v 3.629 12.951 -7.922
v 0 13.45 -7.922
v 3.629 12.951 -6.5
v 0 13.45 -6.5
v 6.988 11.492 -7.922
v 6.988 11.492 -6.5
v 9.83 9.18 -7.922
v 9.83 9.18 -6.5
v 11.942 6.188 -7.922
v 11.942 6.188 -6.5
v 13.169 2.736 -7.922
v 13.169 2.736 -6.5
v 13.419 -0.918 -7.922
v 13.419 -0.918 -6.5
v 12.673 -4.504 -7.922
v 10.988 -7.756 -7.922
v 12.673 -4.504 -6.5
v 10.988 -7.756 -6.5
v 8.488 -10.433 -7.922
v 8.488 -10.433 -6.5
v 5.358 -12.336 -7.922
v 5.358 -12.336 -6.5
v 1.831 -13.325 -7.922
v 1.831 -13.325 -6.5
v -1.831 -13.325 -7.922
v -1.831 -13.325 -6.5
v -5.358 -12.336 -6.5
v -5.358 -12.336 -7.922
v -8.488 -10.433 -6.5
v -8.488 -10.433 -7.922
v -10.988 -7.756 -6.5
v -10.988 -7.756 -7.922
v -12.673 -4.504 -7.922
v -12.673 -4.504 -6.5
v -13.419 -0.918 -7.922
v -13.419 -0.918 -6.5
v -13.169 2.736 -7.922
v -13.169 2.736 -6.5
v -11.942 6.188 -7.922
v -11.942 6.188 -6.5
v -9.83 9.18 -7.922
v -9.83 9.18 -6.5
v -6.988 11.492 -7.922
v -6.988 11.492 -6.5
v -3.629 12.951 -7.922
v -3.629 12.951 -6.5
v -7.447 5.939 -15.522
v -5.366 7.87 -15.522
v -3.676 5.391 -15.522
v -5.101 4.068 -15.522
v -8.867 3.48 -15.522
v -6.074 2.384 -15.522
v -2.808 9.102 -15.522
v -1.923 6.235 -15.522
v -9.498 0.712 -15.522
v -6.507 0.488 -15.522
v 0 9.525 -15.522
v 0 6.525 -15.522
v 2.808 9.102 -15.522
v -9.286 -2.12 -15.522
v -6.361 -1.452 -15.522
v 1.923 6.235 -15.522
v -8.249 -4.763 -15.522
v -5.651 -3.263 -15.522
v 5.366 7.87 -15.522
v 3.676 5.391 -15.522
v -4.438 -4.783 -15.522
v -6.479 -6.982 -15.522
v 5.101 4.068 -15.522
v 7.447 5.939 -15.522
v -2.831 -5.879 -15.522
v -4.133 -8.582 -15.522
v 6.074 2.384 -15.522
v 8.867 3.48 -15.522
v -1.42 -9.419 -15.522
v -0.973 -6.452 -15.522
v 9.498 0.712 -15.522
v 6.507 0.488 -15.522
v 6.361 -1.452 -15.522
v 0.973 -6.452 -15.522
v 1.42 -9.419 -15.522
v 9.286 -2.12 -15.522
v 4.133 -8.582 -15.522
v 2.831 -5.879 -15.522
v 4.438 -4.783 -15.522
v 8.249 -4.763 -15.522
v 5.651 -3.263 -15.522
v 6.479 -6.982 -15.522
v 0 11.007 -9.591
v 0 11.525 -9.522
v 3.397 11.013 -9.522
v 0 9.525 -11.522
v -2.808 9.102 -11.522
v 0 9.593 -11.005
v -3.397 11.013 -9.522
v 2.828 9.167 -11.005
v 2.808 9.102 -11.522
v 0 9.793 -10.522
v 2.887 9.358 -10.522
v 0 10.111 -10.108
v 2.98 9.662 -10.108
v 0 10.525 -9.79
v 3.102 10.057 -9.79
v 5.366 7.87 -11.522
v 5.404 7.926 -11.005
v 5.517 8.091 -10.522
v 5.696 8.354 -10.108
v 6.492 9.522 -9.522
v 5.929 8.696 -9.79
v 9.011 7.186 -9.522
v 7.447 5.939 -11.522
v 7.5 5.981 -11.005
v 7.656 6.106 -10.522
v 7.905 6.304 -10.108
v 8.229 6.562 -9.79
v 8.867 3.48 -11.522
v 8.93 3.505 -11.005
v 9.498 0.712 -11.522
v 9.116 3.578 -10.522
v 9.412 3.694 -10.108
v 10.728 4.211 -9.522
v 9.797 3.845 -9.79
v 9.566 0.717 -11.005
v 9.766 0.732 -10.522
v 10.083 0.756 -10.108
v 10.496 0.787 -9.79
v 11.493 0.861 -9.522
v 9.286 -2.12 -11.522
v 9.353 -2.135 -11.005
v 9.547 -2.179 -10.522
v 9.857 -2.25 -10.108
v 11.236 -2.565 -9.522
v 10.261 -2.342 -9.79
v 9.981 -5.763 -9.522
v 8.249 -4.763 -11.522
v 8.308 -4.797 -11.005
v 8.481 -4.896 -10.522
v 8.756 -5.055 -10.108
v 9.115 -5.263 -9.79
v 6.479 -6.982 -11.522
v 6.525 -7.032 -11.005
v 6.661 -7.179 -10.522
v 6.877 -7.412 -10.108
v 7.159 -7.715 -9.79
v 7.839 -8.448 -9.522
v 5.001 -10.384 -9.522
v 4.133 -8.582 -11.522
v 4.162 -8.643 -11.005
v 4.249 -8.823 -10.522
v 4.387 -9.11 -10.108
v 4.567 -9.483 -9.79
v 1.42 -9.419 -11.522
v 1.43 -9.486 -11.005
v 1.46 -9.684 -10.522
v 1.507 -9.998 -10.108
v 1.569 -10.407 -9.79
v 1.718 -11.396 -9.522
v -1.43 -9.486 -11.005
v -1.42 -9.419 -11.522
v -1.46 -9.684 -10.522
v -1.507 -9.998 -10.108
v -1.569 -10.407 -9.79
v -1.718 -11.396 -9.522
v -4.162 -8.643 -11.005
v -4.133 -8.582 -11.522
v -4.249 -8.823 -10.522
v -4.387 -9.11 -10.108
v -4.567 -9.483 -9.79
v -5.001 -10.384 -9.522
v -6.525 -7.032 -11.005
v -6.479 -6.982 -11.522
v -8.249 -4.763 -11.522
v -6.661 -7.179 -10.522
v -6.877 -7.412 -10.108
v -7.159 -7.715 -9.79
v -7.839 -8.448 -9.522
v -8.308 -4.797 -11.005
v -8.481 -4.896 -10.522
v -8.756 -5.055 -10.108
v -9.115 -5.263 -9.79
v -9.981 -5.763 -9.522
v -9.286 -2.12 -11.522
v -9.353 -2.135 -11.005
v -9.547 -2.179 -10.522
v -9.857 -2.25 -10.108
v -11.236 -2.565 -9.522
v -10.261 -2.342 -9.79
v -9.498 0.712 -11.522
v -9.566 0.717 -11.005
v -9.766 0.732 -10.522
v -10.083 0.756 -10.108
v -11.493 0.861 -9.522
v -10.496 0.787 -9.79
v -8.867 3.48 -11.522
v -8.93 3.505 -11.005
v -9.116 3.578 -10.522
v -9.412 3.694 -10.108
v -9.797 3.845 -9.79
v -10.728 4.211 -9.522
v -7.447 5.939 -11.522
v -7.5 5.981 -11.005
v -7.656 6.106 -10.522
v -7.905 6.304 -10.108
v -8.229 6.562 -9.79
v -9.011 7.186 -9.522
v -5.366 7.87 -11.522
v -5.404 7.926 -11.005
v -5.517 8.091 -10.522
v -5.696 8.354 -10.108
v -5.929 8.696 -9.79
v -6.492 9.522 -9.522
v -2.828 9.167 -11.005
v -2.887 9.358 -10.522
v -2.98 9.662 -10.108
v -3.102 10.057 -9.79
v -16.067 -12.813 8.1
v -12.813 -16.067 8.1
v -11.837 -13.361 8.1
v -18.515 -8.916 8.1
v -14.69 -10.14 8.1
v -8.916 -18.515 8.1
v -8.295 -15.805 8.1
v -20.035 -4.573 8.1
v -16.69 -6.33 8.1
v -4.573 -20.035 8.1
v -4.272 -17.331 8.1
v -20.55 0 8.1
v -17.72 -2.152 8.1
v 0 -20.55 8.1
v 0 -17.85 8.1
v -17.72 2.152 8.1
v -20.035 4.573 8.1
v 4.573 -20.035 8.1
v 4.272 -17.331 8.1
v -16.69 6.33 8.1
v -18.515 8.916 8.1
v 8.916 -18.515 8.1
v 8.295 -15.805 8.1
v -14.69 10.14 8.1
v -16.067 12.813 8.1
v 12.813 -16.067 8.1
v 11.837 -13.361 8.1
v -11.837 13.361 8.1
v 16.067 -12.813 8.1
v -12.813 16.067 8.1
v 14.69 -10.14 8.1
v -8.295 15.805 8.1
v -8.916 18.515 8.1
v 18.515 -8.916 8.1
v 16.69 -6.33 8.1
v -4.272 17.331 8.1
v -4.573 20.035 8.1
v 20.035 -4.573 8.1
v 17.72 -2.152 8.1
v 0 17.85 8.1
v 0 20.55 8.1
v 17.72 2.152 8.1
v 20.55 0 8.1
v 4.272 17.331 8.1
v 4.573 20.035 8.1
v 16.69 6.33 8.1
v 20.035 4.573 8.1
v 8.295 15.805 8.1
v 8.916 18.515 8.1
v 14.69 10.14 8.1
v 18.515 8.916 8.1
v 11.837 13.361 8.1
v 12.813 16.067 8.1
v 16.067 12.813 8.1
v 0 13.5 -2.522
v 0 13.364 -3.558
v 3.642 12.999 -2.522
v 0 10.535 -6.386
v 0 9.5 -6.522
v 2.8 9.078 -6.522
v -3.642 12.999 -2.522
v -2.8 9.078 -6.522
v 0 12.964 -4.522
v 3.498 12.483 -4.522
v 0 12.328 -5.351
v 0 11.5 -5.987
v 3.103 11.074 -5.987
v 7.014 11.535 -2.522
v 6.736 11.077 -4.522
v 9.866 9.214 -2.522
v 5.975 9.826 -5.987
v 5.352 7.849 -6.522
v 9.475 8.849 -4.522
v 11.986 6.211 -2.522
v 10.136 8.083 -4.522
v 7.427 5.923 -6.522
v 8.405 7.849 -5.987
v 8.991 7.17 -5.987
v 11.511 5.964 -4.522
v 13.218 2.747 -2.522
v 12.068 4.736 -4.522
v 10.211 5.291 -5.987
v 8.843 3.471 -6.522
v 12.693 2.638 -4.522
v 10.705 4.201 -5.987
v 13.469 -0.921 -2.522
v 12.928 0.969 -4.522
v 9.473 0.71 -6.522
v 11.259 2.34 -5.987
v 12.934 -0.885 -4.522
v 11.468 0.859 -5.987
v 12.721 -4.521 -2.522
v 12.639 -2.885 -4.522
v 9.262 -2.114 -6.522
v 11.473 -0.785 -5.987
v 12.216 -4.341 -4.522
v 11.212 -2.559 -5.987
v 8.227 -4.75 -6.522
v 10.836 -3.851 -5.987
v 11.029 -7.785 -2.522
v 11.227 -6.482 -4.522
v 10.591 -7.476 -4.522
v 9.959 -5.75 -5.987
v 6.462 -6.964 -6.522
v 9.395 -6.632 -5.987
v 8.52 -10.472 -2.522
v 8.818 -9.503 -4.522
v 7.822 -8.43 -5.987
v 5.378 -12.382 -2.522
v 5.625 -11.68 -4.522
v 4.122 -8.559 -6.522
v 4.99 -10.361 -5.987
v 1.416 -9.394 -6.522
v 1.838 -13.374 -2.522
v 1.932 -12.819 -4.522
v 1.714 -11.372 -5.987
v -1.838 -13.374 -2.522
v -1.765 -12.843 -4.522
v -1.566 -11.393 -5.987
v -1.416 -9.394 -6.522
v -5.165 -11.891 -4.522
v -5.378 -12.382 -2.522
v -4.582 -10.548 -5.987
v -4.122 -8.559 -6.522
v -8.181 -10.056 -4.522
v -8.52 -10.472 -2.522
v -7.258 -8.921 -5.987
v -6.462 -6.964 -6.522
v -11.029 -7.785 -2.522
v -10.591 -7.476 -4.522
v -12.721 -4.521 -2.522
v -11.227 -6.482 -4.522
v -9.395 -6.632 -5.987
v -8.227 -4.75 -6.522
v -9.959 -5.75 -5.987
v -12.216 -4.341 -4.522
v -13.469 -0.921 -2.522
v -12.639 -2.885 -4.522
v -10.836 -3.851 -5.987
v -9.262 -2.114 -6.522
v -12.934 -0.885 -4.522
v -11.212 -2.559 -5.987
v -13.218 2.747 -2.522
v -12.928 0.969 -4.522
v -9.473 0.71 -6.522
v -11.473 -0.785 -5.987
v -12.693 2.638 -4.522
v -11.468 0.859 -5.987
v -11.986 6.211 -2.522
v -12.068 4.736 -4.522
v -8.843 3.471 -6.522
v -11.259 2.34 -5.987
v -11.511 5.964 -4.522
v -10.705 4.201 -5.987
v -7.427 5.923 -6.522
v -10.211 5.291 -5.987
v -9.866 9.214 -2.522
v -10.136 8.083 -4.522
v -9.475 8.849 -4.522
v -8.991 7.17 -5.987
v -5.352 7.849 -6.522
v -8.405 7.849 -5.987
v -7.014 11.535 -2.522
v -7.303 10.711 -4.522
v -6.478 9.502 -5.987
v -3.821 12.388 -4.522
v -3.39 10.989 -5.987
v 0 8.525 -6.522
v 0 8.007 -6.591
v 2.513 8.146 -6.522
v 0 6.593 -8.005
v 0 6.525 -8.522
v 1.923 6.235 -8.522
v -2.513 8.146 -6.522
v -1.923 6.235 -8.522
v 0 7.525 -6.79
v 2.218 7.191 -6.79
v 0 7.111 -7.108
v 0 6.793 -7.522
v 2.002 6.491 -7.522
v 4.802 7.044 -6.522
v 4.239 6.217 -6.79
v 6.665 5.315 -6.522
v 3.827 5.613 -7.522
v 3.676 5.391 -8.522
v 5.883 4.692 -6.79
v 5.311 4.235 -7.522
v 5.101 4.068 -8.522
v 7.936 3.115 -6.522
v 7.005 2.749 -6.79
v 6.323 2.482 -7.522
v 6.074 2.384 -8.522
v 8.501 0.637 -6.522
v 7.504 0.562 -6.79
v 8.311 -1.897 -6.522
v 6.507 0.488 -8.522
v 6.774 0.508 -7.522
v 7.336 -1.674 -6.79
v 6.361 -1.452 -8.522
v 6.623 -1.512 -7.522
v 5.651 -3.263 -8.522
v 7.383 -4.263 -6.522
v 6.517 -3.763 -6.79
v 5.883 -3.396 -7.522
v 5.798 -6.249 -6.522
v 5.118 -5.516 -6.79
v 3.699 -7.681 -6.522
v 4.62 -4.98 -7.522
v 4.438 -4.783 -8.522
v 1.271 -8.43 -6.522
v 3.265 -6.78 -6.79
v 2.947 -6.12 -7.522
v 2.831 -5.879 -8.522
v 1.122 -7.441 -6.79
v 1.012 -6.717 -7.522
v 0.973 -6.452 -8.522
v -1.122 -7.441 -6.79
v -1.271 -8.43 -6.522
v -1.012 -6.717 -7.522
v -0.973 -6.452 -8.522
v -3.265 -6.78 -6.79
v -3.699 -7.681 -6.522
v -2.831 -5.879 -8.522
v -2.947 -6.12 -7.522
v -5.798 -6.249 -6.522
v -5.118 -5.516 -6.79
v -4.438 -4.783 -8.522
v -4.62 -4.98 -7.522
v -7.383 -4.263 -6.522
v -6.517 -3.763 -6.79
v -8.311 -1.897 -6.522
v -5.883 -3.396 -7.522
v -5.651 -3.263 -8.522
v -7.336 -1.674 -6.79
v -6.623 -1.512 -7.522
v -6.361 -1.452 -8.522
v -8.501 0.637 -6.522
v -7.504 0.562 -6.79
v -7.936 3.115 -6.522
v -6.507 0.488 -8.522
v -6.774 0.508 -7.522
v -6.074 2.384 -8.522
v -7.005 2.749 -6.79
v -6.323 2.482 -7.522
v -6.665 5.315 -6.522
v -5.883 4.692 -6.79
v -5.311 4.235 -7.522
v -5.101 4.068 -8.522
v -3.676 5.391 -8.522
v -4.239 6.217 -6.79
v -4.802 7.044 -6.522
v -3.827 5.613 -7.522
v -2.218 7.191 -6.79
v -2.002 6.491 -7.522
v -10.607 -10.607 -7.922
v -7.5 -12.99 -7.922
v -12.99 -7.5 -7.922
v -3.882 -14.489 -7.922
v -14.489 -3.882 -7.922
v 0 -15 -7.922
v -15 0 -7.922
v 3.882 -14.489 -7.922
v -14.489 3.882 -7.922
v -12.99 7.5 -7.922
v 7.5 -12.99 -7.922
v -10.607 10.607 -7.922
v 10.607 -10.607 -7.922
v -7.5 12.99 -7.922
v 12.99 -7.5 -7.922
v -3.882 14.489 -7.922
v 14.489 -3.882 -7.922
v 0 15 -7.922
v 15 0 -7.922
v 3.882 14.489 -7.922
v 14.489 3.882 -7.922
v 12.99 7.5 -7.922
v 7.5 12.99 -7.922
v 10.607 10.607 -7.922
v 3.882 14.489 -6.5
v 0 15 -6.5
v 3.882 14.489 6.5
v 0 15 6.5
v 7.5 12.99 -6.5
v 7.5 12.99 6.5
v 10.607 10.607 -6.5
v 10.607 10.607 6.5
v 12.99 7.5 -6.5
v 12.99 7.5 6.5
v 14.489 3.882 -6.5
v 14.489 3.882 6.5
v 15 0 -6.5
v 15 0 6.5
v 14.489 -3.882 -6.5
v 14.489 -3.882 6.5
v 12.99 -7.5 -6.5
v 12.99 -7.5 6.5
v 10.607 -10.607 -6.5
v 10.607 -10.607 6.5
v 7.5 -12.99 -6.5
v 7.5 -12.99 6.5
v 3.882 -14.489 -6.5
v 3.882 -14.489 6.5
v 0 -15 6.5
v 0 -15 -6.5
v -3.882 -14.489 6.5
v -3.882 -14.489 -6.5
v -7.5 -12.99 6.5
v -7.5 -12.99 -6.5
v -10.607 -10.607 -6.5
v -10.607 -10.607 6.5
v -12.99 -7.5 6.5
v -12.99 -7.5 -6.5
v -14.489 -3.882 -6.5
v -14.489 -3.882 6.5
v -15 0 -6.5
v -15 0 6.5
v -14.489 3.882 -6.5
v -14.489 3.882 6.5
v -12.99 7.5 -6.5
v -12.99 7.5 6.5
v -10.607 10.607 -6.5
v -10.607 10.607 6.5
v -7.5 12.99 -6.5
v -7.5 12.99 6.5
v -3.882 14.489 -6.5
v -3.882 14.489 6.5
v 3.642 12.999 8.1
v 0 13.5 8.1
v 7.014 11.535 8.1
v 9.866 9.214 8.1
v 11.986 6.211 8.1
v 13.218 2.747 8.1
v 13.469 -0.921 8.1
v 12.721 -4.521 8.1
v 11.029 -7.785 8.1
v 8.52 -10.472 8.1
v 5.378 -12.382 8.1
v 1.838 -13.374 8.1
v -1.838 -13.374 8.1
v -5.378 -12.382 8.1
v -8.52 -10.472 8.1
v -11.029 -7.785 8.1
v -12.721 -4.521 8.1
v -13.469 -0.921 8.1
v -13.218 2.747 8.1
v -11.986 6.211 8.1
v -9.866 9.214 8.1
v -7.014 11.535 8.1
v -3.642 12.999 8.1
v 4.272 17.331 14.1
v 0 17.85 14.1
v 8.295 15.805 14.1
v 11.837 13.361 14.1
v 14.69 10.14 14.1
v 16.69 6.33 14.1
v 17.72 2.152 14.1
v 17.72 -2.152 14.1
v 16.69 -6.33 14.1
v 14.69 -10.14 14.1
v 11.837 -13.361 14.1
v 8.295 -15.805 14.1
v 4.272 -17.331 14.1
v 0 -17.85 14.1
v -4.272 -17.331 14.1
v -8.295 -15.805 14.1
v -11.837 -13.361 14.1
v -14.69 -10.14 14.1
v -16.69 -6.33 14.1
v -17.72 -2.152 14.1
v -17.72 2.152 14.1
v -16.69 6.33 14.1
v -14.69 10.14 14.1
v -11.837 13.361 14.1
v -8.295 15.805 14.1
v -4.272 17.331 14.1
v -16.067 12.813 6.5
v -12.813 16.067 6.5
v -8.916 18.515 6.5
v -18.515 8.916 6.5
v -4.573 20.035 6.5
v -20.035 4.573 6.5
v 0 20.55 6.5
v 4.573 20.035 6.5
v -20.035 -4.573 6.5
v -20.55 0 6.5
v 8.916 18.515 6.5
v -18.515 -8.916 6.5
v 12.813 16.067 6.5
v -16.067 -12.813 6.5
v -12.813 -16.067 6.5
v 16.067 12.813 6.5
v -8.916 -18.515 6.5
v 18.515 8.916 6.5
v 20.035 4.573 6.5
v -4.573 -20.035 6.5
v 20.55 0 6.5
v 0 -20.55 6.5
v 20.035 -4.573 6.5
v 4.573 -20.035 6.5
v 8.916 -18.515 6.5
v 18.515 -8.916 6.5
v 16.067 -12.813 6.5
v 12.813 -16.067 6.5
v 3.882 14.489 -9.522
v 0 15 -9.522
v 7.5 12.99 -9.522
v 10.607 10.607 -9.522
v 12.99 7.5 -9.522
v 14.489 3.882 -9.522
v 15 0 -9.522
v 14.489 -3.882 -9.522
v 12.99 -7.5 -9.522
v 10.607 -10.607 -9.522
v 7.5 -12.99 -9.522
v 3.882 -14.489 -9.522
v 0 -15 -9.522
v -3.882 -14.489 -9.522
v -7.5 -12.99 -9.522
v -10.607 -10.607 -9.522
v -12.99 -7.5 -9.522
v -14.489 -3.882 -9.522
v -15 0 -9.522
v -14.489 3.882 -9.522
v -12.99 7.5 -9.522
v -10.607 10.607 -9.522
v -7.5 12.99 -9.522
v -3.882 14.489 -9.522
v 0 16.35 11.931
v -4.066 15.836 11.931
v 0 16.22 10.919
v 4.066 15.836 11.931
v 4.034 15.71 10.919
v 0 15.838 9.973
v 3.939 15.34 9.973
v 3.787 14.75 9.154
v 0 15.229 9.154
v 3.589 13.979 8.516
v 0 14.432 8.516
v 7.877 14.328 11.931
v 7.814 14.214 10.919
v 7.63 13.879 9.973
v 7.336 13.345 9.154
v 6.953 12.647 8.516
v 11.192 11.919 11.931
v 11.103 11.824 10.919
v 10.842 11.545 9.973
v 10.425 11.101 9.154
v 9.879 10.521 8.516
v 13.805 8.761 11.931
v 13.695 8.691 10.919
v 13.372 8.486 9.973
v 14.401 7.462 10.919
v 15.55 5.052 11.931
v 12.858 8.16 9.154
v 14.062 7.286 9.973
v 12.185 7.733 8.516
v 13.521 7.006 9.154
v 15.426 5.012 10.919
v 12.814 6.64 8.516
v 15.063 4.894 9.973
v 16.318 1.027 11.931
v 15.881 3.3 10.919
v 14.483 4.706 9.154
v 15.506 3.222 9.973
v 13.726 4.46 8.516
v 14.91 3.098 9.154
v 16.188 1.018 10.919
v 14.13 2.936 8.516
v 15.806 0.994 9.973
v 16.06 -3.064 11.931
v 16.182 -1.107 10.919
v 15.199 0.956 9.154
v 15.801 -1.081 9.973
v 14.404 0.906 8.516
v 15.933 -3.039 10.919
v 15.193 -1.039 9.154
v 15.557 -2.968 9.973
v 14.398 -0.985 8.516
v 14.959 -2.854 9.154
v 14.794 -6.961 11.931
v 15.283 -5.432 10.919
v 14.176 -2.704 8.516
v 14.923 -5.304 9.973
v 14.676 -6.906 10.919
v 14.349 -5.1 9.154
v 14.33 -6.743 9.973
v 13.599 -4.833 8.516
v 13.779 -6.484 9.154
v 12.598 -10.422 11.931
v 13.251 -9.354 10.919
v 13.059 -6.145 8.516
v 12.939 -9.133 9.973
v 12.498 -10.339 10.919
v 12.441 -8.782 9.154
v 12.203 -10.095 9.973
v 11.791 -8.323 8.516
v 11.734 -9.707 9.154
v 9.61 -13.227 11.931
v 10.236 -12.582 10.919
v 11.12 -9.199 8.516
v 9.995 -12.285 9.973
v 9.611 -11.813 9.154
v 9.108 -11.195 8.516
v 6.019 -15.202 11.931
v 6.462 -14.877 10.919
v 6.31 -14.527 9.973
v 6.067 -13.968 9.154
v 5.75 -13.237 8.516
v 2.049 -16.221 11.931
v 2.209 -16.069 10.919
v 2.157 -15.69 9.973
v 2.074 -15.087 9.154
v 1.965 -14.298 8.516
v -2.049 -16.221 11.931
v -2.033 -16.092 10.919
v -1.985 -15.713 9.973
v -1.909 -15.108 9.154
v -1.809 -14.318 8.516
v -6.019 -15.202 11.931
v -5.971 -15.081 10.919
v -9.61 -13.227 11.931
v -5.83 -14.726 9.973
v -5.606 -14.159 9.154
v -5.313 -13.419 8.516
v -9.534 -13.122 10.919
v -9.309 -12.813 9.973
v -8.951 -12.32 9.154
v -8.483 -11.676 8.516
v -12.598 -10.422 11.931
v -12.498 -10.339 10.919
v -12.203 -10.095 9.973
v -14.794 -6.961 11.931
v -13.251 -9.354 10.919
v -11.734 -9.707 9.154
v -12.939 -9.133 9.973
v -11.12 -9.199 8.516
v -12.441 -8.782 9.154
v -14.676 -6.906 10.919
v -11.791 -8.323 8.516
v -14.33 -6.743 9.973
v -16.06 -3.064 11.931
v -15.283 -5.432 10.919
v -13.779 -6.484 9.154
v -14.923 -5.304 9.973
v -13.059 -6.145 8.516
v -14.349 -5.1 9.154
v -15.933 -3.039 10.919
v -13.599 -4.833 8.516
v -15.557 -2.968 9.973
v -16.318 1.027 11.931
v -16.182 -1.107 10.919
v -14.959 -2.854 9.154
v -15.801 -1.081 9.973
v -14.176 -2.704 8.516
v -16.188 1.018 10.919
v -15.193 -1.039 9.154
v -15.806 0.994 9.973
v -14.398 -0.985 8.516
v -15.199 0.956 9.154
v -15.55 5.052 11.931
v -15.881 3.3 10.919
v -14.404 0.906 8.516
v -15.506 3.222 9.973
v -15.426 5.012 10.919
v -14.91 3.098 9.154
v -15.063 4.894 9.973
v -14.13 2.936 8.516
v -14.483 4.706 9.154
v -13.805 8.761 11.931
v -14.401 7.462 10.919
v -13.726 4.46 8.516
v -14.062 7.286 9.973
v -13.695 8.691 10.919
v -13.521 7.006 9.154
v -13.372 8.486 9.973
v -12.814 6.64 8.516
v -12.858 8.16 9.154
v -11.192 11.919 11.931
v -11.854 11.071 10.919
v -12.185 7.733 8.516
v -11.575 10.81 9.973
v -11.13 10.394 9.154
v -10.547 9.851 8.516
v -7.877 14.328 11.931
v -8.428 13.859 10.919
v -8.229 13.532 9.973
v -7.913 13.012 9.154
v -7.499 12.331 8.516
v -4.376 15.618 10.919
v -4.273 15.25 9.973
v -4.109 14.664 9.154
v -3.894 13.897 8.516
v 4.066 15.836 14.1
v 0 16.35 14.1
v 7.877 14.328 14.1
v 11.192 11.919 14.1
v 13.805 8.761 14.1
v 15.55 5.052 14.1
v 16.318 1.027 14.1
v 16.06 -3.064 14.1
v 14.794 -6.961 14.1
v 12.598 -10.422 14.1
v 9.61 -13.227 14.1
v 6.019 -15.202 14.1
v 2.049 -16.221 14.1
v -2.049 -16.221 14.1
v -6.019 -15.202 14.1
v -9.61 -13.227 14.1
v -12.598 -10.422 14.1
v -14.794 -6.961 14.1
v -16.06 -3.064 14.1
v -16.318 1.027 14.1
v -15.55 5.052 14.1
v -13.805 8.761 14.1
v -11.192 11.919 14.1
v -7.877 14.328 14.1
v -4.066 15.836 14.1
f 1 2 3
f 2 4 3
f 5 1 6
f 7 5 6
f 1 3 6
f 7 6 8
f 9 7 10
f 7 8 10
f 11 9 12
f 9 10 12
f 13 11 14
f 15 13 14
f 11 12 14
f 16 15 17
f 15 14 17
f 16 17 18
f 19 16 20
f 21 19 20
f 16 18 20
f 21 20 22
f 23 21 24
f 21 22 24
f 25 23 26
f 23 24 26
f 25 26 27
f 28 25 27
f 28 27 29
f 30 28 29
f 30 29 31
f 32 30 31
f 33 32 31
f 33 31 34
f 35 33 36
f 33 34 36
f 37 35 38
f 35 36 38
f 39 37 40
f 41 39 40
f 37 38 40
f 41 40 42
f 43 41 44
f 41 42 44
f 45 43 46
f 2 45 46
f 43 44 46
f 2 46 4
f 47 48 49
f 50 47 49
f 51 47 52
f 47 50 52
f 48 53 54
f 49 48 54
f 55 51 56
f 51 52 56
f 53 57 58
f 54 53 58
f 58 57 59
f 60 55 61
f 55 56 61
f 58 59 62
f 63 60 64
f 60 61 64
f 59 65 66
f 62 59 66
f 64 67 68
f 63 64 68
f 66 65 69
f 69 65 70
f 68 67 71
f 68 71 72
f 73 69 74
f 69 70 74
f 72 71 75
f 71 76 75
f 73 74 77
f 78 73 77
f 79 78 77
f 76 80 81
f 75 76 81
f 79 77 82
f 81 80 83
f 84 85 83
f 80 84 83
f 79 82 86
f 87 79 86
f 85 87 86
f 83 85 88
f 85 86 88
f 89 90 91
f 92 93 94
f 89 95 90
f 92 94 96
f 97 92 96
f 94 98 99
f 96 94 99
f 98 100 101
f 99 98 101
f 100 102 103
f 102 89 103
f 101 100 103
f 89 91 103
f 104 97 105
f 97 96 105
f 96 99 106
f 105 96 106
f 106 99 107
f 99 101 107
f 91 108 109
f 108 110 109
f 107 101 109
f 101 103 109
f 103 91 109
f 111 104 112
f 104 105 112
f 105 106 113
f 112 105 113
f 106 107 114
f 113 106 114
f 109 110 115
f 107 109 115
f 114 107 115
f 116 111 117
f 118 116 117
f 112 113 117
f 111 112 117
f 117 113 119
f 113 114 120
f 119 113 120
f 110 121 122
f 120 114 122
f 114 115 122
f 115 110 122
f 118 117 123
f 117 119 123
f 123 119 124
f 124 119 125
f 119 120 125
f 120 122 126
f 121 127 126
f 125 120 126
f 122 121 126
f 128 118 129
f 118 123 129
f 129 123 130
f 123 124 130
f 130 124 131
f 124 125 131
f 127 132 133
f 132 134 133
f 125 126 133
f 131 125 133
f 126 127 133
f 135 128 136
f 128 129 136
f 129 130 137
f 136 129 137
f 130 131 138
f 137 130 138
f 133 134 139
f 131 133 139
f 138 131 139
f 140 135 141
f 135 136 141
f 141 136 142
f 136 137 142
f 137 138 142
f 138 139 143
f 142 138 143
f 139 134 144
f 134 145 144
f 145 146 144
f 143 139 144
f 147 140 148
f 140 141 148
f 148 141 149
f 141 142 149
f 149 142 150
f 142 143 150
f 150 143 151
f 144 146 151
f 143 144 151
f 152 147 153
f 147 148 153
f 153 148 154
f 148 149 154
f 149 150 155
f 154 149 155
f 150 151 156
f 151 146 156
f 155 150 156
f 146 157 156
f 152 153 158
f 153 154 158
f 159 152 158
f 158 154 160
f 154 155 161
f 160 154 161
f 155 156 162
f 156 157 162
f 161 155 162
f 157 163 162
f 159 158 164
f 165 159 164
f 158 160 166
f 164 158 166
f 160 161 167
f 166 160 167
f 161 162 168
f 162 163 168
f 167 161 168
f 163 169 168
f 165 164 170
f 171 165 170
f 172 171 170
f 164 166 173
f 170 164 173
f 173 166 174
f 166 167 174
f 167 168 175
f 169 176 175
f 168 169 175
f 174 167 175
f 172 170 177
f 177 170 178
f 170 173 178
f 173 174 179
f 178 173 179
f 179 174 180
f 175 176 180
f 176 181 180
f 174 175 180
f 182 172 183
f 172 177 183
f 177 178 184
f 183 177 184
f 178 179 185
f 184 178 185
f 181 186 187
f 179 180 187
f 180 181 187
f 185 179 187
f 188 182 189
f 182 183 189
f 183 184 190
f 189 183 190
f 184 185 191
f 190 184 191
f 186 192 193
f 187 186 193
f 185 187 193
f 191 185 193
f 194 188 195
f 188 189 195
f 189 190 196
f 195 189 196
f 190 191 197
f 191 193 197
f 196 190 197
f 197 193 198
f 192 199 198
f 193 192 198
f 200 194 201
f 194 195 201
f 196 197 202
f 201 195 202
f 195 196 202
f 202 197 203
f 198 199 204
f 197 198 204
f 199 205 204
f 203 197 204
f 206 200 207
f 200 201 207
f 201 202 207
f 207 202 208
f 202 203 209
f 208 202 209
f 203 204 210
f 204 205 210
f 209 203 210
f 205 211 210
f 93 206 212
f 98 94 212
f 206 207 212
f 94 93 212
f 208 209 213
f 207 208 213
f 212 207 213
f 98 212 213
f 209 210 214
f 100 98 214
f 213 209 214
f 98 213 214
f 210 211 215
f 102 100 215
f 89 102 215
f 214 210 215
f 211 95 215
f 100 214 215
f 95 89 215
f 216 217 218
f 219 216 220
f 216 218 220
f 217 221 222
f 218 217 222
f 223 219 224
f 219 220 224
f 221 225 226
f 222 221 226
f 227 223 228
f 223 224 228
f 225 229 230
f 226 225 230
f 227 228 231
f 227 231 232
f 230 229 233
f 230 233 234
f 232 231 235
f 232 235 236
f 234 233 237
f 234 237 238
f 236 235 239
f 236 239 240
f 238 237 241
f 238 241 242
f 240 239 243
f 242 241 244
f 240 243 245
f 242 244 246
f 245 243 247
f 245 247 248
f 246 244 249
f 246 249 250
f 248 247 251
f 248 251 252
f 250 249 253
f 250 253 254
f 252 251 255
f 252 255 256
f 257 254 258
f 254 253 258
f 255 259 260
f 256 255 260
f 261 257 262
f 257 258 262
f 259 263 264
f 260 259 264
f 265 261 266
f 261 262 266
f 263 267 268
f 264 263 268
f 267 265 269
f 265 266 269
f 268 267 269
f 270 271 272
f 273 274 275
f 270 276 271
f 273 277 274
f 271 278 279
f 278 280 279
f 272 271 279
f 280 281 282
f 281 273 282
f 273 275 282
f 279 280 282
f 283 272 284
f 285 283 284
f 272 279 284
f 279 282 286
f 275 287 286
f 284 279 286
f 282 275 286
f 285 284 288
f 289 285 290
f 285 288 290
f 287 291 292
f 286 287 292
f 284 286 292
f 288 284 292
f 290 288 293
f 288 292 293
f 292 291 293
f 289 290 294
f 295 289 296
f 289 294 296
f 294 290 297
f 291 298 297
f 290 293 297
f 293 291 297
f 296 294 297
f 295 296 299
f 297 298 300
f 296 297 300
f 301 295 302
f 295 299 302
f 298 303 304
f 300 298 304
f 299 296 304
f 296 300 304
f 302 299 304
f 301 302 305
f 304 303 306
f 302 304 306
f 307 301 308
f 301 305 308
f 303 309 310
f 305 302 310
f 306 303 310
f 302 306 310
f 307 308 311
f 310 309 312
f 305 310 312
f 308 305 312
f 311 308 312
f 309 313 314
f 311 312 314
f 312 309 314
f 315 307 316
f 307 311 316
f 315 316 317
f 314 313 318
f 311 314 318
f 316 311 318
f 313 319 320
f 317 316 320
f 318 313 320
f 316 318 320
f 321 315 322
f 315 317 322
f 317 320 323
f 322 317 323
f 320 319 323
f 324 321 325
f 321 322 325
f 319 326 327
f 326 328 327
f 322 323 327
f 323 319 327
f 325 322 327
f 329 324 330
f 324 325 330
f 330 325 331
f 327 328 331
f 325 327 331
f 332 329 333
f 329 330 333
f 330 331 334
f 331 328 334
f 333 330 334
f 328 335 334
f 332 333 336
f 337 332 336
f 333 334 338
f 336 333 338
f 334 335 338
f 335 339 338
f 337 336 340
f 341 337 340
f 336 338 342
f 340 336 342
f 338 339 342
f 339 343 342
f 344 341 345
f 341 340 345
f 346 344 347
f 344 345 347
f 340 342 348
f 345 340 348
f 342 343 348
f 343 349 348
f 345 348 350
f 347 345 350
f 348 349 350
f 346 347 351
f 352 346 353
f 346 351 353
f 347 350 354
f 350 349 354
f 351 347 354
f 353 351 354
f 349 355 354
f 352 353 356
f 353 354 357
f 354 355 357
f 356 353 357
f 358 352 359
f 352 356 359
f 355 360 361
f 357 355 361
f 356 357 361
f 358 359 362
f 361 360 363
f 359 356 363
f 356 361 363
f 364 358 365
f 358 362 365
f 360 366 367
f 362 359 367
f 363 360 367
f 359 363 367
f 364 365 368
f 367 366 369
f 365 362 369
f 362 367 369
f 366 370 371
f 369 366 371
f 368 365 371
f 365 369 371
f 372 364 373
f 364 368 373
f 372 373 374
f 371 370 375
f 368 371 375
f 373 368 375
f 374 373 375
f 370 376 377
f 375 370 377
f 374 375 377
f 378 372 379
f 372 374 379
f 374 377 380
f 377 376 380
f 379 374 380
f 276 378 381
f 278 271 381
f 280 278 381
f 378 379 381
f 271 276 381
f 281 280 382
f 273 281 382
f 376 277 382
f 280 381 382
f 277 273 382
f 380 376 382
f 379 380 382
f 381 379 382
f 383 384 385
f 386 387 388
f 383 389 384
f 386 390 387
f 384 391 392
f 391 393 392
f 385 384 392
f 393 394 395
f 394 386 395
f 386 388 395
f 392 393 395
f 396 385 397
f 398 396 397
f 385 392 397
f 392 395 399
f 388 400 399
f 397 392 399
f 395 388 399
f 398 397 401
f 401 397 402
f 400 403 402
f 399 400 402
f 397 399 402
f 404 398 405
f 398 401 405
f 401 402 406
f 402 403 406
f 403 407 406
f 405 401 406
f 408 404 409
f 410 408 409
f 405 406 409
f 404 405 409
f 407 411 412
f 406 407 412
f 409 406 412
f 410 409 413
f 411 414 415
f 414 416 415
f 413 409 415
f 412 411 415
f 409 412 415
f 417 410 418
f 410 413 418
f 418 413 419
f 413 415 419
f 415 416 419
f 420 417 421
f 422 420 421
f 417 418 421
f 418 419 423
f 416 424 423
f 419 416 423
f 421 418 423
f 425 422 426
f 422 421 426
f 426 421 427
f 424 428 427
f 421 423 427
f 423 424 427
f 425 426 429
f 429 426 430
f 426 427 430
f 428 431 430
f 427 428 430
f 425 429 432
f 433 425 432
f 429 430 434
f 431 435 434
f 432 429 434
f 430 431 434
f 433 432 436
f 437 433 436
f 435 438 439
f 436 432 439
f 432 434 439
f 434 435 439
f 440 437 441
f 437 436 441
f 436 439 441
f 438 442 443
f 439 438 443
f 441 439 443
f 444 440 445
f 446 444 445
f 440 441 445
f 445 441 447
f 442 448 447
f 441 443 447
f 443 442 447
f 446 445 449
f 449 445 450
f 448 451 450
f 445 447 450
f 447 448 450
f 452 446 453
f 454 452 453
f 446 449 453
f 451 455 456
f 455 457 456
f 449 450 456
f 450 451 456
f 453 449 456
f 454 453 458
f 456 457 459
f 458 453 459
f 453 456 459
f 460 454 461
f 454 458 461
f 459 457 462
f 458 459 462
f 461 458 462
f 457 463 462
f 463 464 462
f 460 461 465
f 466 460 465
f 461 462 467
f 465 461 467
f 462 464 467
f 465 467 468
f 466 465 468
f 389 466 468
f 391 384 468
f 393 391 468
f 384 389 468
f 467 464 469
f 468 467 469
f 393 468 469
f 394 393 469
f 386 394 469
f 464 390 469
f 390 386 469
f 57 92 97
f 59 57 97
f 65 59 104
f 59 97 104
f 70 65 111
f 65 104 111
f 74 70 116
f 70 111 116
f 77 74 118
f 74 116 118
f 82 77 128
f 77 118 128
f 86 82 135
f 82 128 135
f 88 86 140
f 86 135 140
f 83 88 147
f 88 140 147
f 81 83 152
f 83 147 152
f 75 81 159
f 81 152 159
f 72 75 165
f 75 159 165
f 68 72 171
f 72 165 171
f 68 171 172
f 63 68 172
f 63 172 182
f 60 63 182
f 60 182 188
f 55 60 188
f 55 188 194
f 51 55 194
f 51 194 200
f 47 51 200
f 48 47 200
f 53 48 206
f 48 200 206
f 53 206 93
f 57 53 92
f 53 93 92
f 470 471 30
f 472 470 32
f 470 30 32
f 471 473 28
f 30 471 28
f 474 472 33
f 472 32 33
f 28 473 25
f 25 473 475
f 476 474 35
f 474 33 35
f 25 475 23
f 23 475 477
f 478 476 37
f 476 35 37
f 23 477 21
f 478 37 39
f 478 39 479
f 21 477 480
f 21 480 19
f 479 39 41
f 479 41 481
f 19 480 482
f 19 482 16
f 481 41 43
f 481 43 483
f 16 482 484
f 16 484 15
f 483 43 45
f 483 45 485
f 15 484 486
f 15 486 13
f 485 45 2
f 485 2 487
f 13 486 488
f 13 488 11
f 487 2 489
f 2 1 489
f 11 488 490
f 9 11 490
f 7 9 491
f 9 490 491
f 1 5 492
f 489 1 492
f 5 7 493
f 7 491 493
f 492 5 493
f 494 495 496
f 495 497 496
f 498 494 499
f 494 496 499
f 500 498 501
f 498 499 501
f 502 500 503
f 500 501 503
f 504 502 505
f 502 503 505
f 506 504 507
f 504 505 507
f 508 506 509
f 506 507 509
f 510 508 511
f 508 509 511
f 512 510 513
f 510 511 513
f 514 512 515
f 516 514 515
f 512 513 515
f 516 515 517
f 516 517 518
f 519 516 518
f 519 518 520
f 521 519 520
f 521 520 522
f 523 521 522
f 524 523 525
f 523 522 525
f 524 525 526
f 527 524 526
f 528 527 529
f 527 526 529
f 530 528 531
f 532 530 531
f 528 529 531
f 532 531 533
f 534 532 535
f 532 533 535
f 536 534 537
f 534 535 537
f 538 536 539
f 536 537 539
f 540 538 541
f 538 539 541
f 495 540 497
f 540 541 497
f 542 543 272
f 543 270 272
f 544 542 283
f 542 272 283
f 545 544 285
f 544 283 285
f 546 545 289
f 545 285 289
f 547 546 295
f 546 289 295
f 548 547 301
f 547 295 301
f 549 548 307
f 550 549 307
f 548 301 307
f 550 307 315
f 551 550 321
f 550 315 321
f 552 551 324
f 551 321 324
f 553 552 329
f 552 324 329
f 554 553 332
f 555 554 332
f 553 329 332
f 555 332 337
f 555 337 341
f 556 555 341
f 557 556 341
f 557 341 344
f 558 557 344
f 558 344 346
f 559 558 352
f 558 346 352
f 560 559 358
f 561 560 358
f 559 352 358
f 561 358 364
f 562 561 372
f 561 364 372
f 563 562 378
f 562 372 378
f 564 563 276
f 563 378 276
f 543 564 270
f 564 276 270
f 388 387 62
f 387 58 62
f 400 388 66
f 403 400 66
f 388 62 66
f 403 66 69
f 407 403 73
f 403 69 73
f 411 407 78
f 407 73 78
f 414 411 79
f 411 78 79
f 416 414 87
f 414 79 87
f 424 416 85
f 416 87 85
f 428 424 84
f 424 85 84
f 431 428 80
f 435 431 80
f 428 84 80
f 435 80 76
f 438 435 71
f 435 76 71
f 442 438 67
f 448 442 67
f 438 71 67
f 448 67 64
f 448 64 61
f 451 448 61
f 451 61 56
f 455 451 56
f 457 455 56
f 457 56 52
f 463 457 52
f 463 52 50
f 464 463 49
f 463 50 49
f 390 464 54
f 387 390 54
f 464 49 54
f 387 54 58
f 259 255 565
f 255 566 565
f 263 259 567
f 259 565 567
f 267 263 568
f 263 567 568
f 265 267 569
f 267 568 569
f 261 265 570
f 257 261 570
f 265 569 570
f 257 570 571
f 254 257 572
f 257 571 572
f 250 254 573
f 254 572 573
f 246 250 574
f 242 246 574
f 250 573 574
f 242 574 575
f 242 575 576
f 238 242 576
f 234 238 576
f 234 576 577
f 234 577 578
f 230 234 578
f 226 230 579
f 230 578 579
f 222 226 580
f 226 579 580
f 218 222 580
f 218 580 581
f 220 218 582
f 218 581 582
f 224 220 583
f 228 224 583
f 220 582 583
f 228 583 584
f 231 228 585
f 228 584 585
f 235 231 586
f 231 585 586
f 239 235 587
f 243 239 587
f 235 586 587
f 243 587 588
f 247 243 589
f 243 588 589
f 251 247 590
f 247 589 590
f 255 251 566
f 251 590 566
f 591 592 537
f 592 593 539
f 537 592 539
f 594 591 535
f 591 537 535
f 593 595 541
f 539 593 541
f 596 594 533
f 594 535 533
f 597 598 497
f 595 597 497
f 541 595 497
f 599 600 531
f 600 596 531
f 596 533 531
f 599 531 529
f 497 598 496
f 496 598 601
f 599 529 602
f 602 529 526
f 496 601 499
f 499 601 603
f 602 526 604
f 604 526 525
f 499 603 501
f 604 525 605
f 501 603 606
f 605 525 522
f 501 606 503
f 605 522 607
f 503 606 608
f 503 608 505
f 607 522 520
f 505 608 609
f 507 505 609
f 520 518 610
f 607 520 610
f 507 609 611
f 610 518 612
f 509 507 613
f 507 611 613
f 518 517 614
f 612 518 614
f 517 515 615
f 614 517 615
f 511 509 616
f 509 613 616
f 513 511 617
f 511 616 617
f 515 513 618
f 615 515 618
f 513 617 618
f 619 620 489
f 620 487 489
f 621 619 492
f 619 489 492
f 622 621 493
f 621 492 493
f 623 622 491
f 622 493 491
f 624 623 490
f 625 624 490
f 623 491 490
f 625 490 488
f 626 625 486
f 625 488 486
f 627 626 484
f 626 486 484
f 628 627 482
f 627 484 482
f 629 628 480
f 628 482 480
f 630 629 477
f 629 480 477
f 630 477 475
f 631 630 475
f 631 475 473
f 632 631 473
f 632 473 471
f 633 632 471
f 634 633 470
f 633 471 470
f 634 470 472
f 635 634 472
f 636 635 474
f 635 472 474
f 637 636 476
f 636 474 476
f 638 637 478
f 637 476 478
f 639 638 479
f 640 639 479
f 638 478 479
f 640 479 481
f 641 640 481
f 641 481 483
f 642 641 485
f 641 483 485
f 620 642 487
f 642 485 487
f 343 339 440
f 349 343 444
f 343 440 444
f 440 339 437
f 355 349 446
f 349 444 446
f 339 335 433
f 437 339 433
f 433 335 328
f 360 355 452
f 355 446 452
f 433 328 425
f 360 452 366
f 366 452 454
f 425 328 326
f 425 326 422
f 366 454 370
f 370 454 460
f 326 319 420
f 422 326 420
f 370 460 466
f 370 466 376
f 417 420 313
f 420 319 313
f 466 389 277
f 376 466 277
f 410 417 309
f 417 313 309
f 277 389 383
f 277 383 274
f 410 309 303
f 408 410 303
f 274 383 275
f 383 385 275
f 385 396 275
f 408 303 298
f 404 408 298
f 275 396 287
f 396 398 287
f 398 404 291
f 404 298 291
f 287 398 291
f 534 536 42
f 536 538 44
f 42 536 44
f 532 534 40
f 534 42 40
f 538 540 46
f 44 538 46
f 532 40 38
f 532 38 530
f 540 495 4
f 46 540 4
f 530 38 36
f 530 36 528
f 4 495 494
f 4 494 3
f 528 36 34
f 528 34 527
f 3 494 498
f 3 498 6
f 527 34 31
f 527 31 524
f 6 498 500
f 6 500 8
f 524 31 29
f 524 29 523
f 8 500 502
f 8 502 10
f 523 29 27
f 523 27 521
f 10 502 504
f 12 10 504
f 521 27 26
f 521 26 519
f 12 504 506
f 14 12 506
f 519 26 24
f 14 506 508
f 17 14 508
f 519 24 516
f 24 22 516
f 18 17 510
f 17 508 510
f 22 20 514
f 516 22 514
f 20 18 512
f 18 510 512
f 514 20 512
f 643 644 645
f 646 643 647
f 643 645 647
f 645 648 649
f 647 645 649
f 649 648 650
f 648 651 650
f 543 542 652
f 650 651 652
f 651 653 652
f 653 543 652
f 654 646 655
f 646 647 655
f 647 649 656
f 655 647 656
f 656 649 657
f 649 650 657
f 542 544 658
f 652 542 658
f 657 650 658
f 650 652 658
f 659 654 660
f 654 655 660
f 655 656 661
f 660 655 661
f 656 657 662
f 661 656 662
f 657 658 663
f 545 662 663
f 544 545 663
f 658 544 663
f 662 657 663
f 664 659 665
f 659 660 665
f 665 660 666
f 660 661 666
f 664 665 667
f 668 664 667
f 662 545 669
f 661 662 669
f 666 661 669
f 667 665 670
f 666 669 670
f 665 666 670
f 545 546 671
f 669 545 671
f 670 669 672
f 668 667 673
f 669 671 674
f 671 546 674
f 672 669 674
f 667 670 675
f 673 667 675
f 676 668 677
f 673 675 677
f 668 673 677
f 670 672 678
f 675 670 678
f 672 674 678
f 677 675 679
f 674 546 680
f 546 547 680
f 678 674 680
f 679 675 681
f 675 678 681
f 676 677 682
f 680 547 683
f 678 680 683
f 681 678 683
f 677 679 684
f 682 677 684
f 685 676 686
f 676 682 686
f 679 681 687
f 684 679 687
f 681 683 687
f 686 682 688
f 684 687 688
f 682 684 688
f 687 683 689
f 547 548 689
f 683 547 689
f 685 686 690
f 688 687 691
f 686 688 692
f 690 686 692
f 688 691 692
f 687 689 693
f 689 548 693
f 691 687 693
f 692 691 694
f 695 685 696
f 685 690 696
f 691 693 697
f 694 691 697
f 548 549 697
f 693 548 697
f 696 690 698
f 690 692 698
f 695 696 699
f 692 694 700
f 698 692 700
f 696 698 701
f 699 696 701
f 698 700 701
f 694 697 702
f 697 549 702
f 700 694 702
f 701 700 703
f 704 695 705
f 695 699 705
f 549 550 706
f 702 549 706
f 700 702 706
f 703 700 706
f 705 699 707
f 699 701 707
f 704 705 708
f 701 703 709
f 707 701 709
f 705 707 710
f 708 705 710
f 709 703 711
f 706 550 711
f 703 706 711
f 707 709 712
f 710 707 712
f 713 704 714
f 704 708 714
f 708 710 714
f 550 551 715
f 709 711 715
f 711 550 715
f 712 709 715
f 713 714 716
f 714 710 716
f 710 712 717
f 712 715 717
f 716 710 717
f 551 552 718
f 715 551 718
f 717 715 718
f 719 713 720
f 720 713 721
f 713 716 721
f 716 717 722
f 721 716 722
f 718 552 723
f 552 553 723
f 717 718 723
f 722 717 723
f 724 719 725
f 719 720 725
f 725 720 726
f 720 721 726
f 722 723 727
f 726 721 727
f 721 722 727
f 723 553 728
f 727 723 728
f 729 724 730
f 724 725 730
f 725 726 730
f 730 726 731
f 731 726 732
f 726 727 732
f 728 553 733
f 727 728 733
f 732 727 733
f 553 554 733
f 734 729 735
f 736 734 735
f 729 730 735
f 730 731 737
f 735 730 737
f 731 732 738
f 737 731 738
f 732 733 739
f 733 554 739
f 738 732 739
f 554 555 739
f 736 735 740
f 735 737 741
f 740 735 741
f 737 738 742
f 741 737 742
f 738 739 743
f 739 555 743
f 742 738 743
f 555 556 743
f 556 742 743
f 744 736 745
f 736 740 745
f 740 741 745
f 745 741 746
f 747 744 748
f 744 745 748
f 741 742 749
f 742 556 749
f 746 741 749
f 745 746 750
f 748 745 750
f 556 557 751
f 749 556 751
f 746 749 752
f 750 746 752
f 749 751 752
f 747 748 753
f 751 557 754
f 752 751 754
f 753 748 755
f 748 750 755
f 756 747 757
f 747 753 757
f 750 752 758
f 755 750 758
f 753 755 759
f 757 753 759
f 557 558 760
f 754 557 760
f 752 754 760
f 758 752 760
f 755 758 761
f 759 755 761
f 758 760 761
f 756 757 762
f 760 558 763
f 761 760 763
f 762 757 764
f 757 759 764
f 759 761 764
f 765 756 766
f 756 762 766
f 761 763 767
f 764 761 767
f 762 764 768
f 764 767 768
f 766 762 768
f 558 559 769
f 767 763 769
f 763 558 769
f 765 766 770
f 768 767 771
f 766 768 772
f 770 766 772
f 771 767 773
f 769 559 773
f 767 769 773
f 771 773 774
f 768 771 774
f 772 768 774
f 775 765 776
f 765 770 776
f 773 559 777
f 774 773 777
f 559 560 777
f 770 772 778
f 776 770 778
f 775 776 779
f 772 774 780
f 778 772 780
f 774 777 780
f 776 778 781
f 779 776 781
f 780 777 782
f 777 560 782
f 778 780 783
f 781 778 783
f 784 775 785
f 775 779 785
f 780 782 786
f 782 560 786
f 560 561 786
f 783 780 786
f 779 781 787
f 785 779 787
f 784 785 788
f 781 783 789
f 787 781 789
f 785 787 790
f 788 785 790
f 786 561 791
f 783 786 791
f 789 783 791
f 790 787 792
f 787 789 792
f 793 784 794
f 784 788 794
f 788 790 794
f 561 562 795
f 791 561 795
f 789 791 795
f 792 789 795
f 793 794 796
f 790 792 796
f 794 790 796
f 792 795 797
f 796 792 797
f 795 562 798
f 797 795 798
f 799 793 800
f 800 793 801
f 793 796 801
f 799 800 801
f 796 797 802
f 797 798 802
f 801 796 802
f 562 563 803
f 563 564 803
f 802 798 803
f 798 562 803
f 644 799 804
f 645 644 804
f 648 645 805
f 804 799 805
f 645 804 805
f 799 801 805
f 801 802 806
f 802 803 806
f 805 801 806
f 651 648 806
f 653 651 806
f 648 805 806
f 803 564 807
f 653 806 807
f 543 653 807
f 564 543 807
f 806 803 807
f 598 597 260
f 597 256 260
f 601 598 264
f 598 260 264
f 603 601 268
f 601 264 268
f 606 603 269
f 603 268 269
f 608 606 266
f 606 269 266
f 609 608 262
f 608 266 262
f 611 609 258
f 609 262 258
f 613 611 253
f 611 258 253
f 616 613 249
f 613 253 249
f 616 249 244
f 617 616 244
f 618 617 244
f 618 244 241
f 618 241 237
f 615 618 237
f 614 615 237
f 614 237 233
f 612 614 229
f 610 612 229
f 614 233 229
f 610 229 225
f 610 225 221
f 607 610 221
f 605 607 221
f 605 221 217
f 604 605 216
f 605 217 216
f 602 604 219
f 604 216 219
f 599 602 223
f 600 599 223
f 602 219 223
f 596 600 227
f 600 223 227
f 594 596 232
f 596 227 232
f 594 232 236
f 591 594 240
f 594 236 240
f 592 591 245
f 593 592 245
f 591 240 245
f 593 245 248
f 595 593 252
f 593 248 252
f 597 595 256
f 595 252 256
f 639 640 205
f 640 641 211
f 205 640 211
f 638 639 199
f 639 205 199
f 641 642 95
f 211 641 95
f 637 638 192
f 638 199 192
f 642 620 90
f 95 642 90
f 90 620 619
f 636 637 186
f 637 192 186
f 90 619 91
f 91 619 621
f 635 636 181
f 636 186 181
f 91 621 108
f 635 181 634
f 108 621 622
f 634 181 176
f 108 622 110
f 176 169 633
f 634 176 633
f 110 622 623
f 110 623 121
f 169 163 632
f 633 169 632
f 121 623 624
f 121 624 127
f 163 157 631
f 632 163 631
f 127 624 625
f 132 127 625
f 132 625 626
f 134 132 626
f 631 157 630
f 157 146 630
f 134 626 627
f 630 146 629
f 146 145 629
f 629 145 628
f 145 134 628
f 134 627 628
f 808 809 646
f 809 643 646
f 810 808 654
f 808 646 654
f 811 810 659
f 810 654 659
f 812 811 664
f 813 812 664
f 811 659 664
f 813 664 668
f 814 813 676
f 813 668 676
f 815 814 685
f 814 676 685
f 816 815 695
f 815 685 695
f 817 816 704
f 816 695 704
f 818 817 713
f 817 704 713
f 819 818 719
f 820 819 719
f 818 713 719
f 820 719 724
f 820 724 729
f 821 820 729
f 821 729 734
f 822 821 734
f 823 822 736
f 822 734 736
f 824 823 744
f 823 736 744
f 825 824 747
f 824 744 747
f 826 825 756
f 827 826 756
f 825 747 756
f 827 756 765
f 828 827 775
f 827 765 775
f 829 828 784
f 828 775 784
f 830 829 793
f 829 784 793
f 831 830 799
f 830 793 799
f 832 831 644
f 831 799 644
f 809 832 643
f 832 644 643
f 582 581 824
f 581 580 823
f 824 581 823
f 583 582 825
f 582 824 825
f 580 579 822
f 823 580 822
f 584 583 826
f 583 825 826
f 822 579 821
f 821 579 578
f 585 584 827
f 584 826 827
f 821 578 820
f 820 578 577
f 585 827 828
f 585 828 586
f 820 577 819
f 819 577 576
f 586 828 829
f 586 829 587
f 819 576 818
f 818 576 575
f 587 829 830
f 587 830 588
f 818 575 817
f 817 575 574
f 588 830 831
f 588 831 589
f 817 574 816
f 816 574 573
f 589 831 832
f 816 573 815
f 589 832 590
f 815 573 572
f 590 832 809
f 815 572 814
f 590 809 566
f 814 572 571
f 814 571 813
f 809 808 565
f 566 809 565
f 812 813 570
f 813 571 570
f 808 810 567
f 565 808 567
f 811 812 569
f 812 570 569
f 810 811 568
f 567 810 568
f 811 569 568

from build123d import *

# Parameters (mm, degrees)
FILLET2_R = 2


with BuildPart() as part:
    # Sketch2 → Revolve1 (revolve)
    with BuildSketch(Plane(origin=(0, 0, 0), x_dir=(0, 0, -1), z_dir=(1, 0, 0))):
        with BuildLine():
            Line((15.5224, 9.525), (9.5224, 9.525))
            Line((9.5224, 9.525), (9.5224, 15))
            Line((9.5224, 15), (7.9224, 15))
            Line((7.9224, 15), (7.9224, 13.45))
            Line((7.9224, 13.45), (6.5, 13.45))
            Line((6.5, 13.45), (6.5, 15))
            Line((6.5, 15), (-6.5, 15))
            Line((-6.5, 15), (-6.5, 20.55))
            Line((-6.5, 20.55), (-8.1, 20.55))
            Line((-8.1, 20.55), (-8.1, 17.85))
            Line((-8.1, 17.85), (-14.1, 17.85))
            Line((-14.1, 17.85), (-14.1, 16.35))
            Line((-14.1, 16.35), (-11.931122551, 16.35))
            ThreePointArc((-11.931122551, 16.35), (-9.543655274, 15.559361307), (-8.1, 13.5))
            Line((-8.1, 13.5), (2.5224, 13.5))
            ThreePointArc((2.5224, 13.5), (5.350827125, 12.328427125), (6.5224, 9.5))
            Line((6.5224, 9.5), (6.5224, 8.525))
            ThreePointArc((6.5224, 8.525), (7.108186438, 7.110786438), (8.5224, 6.525))
            Line((8.5224, 6.525), (15.5224, 6.525))
            Line((15.5224, 6.525), (15.5224, 9.525))
        make_face()
    revolve(axis=Axis((0, 0, 74.804360453), (0, 0, -1)))

    # Fillet2
    fillet2_edges = [part.edges().sort_by_distance(p)[0] for p in [
        (0, -9.525, -9.5224),
    ]]
    fillet(fillet2_edges, radius=FILLET2_R)


solid = part.part
